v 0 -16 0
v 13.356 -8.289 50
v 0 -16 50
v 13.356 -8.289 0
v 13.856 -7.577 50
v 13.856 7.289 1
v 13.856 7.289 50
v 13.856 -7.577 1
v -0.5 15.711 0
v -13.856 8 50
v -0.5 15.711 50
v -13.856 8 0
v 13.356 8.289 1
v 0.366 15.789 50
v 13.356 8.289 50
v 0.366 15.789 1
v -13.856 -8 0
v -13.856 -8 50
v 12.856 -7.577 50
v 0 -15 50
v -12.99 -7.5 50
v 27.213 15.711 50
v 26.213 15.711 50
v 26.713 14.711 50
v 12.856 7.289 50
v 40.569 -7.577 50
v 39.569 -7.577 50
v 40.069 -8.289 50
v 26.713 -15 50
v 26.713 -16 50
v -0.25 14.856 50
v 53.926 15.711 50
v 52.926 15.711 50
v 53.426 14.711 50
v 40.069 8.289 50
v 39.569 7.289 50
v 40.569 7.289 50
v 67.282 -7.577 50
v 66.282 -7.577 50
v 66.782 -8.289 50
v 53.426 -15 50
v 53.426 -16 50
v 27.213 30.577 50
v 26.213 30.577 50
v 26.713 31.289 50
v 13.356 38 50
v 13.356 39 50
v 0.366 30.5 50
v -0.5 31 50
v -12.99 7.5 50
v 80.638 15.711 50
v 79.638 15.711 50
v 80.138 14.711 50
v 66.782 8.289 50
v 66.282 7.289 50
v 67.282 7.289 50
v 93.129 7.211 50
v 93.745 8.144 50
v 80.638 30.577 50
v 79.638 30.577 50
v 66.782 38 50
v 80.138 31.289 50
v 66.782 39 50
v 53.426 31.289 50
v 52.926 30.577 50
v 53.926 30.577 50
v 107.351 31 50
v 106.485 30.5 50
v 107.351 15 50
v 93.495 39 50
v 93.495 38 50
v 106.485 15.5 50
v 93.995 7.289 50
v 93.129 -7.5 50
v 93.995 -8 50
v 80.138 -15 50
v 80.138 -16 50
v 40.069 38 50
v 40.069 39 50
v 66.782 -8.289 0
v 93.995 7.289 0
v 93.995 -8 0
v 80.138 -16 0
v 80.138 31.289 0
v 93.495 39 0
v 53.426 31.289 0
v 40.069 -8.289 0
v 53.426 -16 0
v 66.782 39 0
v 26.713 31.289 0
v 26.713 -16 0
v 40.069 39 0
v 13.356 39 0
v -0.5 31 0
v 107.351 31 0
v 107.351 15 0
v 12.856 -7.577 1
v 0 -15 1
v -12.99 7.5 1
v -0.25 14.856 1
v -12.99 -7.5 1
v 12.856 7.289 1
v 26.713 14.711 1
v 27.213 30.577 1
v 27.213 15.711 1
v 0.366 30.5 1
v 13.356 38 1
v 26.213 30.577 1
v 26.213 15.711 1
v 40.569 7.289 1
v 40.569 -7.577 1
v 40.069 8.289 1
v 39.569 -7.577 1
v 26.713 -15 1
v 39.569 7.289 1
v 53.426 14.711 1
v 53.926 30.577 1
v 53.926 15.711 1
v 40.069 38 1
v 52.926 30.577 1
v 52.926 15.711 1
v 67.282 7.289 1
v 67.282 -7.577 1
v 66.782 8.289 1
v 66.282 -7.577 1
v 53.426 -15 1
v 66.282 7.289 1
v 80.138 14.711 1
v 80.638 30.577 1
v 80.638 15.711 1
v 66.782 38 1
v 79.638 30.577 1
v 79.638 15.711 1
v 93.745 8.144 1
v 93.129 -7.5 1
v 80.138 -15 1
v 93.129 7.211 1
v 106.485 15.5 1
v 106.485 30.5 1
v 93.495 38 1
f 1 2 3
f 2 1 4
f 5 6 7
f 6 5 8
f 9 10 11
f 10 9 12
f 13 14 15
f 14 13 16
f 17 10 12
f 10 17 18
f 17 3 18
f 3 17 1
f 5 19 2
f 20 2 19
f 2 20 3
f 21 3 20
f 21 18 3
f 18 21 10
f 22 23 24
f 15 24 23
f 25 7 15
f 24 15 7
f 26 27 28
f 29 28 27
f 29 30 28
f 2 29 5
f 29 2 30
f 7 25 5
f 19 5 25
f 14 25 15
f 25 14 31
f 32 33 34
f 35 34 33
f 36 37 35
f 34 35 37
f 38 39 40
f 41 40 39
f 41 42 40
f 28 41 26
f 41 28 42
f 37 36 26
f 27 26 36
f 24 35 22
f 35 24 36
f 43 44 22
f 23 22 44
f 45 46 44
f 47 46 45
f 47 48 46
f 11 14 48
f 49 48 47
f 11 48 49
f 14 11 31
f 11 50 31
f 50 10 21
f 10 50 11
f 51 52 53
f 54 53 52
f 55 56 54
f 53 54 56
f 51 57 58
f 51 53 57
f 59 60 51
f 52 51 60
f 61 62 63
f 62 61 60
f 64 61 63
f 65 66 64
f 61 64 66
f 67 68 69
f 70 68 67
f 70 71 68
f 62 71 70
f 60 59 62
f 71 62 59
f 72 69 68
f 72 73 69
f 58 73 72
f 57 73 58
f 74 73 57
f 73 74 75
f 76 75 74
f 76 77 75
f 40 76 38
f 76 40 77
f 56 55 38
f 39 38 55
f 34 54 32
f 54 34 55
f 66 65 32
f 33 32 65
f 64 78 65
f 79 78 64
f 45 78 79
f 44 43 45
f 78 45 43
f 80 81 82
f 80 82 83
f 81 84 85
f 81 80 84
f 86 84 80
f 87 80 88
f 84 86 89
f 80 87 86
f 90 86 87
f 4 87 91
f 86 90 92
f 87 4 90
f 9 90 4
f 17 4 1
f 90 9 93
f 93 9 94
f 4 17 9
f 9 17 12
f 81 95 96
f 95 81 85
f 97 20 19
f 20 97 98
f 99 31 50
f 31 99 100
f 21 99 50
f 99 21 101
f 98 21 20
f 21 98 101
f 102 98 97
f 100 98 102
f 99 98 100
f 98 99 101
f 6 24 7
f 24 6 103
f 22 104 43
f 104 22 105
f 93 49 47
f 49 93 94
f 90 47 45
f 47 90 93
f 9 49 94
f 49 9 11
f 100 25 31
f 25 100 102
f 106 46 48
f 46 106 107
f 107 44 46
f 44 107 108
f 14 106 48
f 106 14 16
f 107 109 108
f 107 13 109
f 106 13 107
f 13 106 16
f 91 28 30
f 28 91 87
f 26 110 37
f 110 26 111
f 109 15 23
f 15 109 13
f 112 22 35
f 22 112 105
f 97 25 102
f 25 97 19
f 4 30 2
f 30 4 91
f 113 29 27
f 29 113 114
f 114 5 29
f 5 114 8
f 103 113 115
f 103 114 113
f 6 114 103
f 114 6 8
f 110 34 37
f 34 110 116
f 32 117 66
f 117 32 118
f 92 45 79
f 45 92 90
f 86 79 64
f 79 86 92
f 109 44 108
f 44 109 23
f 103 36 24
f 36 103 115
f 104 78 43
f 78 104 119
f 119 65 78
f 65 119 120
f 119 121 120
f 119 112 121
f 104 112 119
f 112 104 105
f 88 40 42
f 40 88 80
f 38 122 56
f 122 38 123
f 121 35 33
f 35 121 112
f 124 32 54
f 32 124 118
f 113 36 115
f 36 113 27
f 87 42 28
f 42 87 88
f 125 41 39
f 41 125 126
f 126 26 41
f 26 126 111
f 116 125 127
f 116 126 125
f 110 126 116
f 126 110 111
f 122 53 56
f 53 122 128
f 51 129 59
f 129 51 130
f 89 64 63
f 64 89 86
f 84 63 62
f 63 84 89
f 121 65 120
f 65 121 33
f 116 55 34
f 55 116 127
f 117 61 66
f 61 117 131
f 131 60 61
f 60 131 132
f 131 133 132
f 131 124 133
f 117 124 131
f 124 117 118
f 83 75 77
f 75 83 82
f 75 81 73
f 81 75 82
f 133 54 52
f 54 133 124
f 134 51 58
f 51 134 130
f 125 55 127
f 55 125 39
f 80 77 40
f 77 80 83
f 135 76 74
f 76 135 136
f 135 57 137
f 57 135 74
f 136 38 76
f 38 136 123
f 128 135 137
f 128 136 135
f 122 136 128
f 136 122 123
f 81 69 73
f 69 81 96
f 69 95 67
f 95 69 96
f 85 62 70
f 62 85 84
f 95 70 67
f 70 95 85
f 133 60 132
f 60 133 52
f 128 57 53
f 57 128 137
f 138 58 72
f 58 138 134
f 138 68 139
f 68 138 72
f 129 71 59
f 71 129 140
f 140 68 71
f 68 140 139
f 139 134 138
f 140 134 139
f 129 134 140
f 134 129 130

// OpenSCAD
height = 50;
diameter = 32;
wall_thickness = 1;
number_of_sets = 4;

module parameters_below_here_are_constant(){}
radius=diameter/2;
apothem = radius*cos(180/6);
$fn=6;

module hex_tube(Height,rad){
	rotate([0,0,30])
	difference(){
		cylinder(h = Height, r = rad);
		translate([0,0,1*wall_thickness])
		cylinder(h = Height, r = rad-wall_thickness);
	}
}

module hex_set(H,R){
	hex_tube(H,R);
	translate([apothem-wall_thickness/2,R+R*cos(60)-wall_thickness/1,0])
	hex_tube(H,R);
}

for(i = [0:number_of_sets-1]){
	translate([(apothem-wall_thickness/2)*2*i,0,0])
	hex_set(height,radius);
}
